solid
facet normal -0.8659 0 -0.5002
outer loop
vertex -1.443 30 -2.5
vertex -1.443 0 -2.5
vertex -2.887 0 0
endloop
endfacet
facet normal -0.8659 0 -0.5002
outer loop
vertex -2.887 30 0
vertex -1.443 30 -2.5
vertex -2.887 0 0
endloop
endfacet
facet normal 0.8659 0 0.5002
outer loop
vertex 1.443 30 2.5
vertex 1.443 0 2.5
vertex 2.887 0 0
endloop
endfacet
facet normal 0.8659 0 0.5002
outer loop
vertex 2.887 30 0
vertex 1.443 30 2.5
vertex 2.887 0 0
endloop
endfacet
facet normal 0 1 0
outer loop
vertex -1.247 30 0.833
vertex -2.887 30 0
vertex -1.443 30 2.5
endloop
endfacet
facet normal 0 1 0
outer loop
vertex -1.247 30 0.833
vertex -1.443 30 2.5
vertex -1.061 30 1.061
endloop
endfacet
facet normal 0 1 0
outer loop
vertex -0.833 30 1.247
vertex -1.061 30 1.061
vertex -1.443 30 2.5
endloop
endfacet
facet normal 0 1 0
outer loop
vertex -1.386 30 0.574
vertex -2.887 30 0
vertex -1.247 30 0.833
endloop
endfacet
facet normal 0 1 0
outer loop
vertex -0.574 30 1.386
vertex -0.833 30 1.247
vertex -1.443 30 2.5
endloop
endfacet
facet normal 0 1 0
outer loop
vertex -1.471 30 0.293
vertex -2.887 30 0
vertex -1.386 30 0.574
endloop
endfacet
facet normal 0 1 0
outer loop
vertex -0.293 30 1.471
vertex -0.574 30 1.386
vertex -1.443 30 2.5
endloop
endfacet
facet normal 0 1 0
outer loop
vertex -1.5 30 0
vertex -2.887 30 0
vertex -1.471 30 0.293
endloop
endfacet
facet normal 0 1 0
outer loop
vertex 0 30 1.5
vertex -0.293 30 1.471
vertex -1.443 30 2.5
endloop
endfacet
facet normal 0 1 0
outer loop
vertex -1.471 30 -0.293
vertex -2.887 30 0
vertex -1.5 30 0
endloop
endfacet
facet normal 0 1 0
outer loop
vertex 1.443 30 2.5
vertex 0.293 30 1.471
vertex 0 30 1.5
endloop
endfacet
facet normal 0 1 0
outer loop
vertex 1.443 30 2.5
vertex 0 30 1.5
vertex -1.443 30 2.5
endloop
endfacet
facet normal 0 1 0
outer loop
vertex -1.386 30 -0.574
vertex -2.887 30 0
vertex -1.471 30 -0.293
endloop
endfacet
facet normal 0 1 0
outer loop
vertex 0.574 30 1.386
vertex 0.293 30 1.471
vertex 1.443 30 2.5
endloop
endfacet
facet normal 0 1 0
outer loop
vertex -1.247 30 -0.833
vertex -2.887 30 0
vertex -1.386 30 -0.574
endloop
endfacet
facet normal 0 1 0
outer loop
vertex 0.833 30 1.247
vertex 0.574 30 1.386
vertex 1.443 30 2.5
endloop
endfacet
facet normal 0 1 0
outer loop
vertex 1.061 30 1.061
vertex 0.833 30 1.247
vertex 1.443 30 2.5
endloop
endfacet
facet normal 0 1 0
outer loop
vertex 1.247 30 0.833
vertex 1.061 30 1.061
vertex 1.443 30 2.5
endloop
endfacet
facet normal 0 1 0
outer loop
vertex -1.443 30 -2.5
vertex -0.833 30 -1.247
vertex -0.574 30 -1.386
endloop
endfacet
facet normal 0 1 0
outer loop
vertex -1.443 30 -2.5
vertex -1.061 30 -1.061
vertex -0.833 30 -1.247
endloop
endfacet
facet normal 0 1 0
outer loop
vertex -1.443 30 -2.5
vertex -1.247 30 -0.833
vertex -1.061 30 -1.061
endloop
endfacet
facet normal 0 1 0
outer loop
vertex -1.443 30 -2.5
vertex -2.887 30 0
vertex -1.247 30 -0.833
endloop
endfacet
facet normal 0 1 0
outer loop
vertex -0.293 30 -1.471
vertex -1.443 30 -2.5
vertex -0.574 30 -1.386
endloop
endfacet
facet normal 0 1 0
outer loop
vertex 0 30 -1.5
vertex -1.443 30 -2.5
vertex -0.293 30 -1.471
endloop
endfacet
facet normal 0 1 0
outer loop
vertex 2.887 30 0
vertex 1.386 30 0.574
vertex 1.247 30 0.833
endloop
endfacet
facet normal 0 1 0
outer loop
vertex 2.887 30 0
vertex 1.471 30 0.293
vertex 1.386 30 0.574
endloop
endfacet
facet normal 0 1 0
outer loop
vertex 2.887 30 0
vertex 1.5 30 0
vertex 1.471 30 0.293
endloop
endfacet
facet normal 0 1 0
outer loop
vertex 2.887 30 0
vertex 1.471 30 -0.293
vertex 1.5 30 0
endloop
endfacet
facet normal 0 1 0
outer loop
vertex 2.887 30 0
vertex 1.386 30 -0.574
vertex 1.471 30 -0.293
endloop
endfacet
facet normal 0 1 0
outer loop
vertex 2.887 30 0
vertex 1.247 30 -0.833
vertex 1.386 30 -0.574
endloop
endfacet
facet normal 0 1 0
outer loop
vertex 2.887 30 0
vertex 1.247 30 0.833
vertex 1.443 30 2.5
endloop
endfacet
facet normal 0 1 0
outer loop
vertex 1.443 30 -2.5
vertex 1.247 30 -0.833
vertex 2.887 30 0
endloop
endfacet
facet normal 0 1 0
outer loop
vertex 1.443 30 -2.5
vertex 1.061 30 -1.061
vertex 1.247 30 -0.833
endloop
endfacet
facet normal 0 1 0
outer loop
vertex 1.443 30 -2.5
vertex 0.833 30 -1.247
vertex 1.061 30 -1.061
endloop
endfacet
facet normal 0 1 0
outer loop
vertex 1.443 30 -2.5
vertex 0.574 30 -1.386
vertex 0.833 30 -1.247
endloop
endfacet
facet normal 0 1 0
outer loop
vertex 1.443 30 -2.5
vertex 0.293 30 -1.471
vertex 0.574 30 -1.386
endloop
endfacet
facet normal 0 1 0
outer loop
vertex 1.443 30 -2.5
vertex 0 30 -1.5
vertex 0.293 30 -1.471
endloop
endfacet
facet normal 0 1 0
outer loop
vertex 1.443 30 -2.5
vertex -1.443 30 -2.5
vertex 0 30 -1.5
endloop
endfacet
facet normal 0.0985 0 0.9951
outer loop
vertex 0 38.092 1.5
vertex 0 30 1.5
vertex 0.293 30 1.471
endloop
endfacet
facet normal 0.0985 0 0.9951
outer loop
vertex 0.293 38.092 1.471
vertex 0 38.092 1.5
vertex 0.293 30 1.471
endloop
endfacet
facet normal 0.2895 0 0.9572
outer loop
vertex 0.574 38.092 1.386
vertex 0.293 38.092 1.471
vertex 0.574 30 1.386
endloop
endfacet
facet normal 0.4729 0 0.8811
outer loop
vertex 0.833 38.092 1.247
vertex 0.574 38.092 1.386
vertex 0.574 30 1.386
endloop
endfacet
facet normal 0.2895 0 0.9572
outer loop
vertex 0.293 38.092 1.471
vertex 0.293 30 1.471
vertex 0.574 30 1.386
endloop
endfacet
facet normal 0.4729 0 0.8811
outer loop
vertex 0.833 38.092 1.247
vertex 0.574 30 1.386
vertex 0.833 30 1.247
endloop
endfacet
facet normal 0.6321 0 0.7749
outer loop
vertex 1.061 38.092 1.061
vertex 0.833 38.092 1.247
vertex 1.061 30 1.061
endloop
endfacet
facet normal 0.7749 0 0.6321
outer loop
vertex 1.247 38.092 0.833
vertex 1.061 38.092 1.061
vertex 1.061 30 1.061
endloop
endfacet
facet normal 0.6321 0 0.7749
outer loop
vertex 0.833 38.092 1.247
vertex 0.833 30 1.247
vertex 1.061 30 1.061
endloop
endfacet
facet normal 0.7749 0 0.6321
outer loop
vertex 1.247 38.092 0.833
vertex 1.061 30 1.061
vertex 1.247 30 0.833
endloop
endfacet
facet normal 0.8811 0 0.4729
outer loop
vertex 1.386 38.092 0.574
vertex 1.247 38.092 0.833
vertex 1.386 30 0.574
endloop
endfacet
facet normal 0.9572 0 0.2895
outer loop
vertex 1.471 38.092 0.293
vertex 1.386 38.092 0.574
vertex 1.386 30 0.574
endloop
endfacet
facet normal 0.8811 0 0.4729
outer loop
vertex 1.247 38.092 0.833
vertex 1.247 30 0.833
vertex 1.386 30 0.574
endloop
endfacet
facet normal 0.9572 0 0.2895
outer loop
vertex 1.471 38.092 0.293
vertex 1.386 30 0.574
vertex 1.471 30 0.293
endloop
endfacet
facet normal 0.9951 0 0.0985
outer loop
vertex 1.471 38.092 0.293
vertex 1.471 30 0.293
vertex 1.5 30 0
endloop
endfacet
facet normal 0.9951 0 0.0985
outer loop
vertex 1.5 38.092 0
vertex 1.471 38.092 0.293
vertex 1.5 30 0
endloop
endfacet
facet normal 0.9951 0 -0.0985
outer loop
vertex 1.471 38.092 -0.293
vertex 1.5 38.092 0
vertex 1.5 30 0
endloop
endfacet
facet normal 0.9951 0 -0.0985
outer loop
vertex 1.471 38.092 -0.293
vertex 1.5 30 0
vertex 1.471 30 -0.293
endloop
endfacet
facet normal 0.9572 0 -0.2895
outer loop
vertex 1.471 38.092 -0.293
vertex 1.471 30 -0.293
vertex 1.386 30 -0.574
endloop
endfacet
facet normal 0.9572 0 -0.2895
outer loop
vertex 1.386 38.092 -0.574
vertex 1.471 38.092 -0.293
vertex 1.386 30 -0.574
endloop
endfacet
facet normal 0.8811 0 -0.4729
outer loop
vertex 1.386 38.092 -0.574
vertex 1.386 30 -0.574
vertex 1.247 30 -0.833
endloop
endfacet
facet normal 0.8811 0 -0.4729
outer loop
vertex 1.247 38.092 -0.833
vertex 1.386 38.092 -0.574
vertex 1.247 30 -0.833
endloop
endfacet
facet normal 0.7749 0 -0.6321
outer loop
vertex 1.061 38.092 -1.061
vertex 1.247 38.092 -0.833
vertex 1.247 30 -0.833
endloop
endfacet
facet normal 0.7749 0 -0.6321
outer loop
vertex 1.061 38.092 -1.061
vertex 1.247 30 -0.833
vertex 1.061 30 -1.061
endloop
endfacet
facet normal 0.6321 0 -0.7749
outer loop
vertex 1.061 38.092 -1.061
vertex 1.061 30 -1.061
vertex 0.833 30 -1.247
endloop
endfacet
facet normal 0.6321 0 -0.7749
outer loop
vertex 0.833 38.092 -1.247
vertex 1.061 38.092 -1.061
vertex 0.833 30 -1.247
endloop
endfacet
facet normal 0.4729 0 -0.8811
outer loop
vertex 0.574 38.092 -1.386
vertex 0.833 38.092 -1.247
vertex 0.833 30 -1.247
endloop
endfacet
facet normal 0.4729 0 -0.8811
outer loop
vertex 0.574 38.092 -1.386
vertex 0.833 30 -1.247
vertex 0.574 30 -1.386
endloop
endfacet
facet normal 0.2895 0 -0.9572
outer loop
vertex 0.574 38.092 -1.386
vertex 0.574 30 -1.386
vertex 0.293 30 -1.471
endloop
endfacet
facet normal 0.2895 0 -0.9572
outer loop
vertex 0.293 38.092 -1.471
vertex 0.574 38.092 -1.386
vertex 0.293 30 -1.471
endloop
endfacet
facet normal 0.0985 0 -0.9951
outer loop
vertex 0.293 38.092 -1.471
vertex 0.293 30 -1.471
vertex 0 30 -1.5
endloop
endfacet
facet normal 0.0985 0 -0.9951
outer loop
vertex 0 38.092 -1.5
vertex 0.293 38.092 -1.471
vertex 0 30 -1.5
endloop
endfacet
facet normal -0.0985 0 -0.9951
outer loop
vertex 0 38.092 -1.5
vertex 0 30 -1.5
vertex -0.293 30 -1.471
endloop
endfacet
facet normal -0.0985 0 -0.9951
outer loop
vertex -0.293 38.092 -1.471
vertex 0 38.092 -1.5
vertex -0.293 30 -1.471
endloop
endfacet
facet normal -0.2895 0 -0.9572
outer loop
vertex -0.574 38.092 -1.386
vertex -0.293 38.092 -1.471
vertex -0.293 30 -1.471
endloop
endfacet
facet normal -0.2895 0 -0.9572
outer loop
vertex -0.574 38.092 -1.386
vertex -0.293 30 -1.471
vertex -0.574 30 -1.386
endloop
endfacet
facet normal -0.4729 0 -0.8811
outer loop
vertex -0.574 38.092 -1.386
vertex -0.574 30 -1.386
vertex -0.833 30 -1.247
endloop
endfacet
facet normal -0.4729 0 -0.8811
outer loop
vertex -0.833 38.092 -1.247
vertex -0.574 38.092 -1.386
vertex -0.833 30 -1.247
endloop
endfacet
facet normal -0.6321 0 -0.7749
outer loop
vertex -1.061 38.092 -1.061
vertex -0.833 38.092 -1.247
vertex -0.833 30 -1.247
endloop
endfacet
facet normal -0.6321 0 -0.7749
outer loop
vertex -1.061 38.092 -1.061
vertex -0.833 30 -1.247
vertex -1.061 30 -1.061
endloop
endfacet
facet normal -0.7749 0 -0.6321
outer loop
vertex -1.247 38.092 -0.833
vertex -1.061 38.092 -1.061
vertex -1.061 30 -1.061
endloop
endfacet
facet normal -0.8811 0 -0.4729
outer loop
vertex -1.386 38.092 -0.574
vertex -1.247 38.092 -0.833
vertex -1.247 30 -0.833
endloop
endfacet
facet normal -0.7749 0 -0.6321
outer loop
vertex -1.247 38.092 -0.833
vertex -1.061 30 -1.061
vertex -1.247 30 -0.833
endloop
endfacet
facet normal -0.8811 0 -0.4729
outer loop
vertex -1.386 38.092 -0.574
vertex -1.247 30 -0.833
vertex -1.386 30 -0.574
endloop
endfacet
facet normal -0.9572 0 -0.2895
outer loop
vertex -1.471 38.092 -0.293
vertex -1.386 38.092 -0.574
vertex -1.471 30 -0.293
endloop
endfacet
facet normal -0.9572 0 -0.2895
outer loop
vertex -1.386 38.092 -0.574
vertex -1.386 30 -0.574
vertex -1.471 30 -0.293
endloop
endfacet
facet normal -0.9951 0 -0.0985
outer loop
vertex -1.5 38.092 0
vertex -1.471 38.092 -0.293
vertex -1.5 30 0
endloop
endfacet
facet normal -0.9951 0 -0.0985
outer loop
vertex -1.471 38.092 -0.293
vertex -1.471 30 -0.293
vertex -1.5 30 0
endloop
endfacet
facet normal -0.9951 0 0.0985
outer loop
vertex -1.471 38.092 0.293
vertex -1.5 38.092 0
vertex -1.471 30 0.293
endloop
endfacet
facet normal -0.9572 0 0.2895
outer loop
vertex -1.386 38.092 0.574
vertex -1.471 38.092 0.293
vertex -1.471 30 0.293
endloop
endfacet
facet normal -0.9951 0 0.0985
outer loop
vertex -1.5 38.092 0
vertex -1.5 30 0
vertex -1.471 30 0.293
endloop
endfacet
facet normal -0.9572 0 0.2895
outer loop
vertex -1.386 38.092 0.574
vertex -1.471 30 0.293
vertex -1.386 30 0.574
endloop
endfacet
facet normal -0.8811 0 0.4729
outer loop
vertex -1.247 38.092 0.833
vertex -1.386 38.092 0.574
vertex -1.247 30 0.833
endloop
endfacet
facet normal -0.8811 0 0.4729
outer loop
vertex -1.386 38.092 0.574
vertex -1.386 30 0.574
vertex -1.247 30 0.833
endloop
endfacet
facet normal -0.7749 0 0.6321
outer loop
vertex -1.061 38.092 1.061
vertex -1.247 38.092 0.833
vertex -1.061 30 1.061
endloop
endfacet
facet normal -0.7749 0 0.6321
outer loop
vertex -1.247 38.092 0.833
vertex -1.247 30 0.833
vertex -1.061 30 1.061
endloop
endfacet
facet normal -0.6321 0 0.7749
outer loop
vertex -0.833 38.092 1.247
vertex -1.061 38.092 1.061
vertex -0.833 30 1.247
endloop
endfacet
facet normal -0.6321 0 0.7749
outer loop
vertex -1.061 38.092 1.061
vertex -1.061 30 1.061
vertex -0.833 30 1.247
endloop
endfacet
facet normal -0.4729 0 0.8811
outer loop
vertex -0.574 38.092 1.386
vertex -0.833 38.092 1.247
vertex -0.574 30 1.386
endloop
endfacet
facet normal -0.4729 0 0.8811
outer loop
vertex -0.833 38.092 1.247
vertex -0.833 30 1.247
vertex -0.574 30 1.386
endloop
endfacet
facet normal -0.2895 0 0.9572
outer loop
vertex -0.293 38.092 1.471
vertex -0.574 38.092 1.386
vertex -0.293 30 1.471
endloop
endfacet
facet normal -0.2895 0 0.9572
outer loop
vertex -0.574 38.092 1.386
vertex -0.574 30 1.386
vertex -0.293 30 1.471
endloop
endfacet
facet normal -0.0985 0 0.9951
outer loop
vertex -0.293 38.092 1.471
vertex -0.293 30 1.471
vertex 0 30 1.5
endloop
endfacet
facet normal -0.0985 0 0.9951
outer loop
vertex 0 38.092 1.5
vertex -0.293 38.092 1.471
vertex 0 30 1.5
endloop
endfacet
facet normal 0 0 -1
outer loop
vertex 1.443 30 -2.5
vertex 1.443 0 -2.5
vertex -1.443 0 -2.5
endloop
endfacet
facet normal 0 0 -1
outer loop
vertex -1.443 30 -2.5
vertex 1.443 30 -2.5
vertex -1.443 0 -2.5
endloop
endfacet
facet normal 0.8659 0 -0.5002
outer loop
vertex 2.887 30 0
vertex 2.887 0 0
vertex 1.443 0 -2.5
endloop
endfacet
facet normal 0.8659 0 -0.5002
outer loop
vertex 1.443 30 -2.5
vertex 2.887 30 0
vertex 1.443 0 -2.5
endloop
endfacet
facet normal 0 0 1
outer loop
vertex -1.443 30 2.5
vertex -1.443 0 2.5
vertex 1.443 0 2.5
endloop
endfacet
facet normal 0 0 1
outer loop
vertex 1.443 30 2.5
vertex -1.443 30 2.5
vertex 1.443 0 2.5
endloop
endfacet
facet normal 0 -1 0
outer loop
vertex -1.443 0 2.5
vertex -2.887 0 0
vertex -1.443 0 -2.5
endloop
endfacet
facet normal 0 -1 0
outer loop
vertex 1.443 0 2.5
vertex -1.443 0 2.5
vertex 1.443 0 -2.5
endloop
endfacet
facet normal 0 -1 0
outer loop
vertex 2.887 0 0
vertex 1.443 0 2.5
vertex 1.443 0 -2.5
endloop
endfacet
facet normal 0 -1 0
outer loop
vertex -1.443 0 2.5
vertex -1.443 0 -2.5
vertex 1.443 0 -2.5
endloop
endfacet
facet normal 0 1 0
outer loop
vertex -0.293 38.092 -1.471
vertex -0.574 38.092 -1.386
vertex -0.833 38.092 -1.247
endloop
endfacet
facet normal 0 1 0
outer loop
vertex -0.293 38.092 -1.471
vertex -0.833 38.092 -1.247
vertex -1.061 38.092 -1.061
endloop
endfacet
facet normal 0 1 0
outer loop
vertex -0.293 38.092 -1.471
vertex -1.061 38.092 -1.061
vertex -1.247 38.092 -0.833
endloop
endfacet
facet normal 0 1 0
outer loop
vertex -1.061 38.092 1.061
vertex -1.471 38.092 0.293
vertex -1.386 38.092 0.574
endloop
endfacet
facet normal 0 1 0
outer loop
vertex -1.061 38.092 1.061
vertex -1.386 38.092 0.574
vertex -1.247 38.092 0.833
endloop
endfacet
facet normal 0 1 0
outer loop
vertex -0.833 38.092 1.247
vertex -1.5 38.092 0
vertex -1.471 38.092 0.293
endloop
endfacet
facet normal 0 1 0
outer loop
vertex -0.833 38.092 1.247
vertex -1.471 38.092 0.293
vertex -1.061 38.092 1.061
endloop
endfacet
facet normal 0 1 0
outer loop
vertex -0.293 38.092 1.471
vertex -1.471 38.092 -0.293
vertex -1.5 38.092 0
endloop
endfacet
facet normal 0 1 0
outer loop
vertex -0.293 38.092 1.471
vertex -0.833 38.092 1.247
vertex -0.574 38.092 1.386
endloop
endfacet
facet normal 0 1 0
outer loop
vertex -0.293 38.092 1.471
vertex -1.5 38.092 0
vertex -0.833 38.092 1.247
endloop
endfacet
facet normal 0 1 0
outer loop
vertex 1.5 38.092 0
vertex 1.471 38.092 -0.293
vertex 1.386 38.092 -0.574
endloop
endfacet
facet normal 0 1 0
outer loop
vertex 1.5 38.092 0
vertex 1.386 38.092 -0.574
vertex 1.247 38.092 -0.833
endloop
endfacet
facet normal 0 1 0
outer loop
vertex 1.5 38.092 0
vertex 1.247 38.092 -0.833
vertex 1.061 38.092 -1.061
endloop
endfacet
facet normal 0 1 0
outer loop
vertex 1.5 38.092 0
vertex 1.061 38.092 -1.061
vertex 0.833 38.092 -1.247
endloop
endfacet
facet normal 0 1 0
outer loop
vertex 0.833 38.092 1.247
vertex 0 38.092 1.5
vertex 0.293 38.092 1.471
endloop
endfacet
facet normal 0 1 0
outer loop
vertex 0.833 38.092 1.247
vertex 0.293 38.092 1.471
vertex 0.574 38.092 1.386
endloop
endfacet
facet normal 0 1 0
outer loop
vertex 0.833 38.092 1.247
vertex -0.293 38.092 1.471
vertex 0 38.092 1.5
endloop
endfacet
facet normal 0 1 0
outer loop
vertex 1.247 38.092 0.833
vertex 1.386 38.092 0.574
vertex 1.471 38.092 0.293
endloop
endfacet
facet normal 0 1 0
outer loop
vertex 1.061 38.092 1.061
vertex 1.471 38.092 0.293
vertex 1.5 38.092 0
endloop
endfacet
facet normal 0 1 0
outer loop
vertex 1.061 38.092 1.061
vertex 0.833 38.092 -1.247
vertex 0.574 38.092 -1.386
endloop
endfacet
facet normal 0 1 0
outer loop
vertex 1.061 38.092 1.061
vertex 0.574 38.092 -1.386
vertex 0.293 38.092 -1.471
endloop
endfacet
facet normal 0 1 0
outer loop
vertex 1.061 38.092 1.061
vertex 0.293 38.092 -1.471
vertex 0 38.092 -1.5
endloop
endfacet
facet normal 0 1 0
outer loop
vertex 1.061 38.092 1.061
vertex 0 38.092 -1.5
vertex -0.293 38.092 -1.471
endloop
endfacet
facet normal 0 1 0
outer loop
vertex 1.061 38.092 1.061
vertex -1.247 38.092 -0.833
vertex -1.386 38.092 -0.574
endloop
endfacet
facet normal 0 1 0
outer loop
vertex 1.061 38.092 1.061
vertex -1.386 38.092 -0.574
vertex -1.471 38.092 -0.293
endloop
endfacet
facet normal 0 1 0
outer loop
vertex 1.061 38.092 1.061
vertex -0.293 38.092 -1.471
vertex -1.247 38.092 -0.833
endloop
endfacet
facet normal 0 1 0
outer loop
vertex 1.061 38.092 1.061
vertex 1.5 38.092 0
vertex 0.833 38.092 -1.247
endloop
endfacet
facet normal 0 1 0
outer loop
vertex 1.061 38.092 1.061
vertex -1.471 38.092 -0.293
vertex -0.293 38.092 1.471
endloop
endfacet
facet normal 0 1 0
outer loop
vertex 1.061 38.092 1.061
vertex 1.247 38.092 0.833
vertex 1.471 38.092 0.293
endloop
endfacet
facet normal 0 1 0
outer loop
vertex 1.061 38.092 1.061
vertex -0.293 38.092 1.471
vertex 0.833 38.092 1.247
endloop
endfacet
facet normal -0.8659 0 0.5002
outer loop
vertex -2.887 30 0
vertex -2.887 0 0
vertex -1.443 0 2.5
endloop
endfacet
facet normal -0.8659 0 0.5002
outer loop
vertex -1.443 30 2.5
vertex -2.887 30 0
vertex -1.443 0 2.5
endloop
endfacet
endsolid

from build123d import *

# Parameters (mm, degrees)
BOSS_EXTRUDE1_DEPTH = 30
SKETCH5_R           = 1.5
BOSS_EXTRUDE2_DEPTH = 8.091605471
SKETCH5_2_R         = 1.5
BOSS_EXTRUDE3_DEPTH = 8


with BuildPart() as part:
    # Sketch3 → Boss-Extrude1 (new body)
    with BuildSketch(Plane(origin=(0, 0, 0), x_dir=(1, 0, 0), z_dir=(0, 1, 0))):
        Polygon((-2.886751346, 0), (-1.443375673, -2.5), (1.443375673, -2.5), (2.886751346, 0), (1.443375673, 2.5), (-1.443375673, 2.5), align=None)
    extrude(amount=BOSS_EXTRUDE1_DEPTH)

    # Sketch5 → Boss-Extrude2 (add)
    with BuildSketch(Plane(origin=(0, 30, 0), x_dir=(1, 0, 0), z_dir=(0, 1, 0))):
        Circle(SKETCH5_R)
    extrude(amount=BOSS_EXTRUDE2_DEPTH)

    # Sketch5<2> → Boss-Extrude3 (add)
    with BuildSketch(Plane(origin=(0, 30, 0), x_dir=(1, 0, 0), z_dir=(0, 1, 0))):
        Circle(SKETCH5_2_R)
    extrude(amount=BOSS_EXTRUDE3_DEPTH)


solid = part.part
